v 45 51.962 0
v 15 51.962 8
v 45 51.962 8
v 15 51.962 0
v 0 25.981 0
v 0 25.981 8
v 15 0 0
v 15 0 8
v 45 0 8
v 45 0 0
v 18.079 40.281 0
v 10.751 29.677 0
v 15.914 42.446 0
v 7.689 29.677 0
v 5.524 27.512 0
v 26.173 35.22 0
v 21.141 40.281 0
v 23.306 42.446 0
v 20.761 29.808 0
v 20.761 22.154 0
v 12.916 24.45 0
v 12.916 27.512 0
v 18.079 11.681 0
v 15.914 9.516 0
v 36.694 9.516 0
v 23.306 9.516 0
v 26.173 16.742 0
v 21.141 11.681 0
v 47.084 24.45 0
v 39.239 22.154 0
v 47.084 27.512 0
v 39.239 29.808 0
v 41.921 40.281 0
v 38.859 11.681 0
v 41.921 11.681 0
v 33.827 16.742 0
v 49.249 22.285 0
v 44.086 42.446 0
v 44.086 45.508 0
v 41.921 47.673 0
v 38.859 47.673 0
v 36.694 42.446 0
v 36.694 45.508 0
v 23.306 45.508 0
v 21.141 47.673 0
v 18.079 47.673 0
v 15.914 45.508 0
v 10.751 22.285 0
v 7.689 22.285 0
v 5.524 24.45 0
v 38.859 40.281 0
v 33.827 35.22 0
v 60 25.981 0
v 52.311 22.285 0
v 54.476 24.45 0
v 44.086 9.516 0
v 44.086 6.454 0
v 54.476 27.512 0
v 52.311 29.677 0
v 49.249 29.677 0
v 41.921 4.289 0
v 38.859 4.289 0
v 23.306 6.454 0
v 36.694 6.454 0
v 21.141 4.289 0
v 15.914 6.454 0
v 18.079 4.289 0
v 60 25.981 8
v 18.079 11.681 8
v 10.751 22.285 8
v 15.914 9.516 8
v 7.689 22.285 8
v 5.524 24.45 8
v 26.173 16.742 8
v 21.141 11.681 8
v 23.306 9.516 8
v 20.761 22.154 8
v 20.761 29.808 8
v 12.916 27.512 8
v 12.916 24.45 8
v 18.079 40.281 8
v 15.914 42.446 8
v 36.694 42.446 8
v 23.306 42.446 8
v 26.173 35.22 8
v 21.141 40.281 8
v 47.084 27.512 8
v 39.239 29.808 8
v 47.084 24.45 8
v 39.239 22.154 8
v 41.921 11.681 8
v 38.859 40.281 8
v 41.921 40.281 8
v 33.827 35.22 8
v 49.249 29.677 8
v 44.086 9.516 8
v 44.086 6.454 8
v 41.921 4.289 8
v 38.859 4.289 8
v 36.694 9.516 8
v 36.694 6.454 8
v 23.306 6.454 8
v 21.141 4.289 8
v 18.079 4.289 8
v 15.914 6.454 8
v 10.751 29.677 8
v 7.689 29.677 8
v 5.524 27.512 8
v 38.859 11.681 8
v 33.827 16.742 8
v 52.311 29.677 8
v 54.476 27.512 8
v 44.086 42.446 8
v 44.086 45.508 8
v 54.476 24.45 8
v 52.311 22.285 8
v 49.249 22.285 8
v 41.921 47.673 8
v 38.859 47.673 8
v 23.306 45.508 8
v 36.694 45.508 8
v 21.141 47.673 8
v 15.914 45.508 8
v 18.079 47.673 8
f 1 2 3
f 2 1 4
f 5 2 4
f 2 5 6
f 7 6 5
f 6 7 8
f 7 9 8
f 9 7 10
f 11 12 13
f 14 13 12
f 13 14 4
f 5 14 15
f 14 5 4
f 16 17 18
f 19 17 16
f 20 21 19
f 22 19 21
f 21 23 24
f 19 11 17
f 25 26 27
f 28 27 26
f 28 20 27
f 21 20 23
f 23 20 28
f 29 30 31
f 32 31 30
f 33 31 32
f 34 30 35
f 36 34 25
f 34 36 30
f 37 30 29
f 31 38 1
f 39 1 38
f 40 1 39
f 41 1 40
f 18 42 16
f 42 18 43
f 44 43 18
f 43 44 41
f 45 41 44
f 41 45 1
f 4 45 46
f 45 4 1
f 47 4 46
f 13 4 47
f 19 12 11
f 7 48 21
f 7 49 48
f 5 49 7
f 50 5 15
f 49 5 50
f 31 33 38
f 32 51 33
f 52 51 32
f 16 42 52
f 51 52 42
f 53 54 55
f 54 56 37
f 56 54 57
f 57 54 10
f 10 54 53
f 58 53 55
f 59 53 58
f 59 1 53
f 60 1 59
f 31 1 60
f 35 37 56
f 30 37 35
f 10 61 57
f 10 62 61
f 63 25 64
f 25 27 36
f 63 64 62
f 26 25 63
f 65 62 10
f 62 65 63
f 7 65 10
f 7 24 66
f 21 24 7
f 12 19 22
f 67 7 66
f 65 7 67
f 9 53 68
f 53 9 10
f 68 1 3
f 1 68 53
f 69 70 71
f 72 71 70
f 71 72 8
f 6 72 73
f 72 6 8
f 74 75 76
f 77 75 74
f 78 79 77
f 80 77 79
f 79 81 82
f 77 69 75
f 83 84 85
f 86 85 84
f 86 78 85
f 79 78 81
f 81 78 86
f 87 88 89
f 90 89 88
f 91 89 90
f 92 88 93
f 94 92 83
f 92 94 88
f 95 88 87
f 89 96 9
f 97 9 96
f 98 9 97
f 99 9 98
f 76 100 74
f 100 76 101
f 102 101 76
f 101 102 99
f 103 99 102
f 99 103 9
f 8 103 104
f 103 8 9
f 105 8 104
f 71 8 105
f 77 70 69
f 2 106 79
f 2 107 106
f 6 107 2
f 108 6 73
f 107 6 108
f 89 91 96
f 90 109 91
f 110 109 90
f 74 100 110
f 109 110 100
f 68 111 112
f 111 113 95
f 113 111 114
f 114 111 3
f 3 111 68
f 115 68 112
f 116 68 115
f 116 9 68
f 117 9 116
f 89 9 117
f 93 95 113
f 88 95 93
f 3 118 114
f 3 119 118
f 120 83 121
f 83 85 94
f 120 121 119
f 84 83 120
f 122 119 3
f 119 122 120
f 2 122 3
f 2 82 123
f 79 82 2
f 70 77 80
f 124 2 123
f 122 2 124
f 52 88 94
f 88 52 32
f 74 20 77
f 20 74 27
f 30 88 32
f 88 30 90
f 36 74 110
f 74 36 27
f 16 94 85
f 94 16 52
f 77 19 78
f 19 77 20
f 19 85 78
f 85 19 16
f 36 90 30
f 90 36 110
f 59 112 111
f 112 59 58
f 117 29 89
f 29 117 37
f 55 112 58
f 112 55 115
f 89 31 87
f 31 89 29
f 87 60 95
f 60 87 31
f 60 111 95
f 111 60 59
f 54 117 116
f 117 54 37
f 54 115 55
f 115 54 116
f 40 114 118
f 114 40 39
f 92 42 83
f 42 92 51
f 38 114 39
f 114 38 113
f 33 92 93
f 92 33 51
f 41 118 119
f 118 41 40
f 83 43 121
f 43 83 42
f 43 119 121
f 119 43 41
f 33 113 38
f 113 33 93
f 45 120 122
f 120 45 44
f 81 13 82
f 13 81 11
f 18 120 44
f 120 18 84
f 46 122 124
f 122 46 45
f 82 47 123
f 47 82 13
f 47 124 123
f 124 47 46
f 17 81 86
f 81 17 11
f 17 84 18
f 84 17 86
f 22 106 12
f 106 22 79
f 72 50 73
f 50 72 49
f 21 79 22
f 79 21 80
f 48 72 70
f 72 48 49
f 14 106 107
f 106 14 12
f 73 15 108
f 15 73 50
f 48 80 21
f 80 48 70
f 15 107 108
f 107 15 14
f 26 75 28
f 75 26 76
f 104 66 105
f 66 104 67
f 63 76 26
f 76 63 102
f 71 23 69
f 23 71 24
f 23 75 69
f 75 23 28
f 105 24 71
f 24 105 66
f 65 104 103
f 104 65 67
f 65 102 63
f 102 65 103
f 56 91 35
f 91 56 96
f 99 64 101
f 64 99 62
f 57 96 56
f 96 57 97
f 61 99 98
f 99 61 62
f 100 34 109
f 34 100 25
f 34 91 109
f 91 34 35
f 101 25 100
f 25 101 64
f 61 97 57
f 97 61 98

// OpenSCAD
$fn = 32;

// ----------------------------------------------------------------------
// Polygon plate: 6-gon R30, 6 bolt windows
// ----------------------------------------------------------------------

// --- parameters (mm) ---
sides = 6;                // number of polygon sides
plate_r = 30;             // circumscribed radius of the polygon
bore_r = 10;              // centre bore radius
bolts = 6;                // number of bolt windows
ring_r = 20.78;           // bolt-circle radius
bolt_r = 4;               // bolt window radius
plate_t = 8;              // plate thickness, Z (extrusion height)
fit_tol = 0.02;           // declared fit tolerance (prompt contract)
free_tol = 0.2;           // declared free tolerance (prompt contract)

plate_d = 2 * plate_r;  // circumscribed diameter
bore_d = 2 * bore_r;  // centre bore diameter
bolt_d = 2 * bolt_r;  // bolt window diameter
ring_d = 2 * ring_r;  // bolt-circle diameter

profile = [[60, 25.981], [45, 51.962], [15, 51.962], [0, 25.981], [15, 0], [45, 0]];  // primary outline, 6 points, counter clockwise
void_1 = [[39.239, 29.808], [33.827, 35.22], [26.173, 35.22], [20.761, 29.808], [20.761, 22.154], [26.173, 16.742], [33.827, 16.742], [39.239, 22.154]];  // centre bore, 8 points
void_2 = [[54.476, 27.512], [52.311, 29.677], [49.249, 29.677], [47.084, 27.512], [47.084, 24.45], [49.249, 22.285], [52.311, 22.285], [54.476, 24.45]];  // bolt window 1, 8 points
void_3 = [[44.086, 45.508], [41.921, 47.673], [38.859, 47.673], [36.694, 45.508], [36.694, 42.446], [38.859, 40.281], [41.921, 40.281], [44.086, 42.446]];  // bolt window 2, 8 points
void_4 = [[23.306, 45.508], [21.141, 47.673], [18.079, 47.673], [15.914, 45.508], [15.914, 42.446], [18.079, 40.281], [21.141, 40.281], [23.306, 42.446]];  // bolt window 3, 8 points
void_5 = [[12.916, 27.512], [10.751, 29.677], [7.689, 29.677], [5.524, 27.512], [5.524, 24.45], [7.689, 22.285], [10.751, 22.285], [12.916, 24.45]];  // bolt window 4, 8 points
void_6 = [[23.306, 9.516], [21.141, 11.681], [18.079, 11.681], [15.914, 9.516], [15.914, 6.454], [18.079, 4.289], [21.141, 4.289], [23.306, 6.454]];  // bolt window 5, 8 points
void_7 = [[44.086, 9.516], [41.921, 11.681], [38.859, 11.681], [36.694, 9.516], [36.694, 6.454], [38.859, 4.289], [41.921, 4.289], [44.086, 6.454]];  // bolt window 6, 8 points

// --- the one profile operation ---
difference() {
  linear_extrude(height = plate_t) polygon(points = profile);
  translate([0, 0, -1])
    linear_extrude(height = plate_t + 2) polygon(points = void_1);
  translate([0, 0, -1])
    linear_extrude(height = plate_t + 2) polygon(points = void_2);
  translate([0, 0, -1])
    linear_extrude(height = plate_t + 2) polygon(points = void_3);
  translate([0, 0, -1])
    linear_extrude(height = plate_t + 2) polygon(points = void_4);
  translate([0, 0, -1])
    linear_extrude(height = plate_t + 2) polygon(points = void_5);
  translate([0, 0, -1])
    linear_extrude(height = plate_t + 2) polygon(points = void_6);
  translate([0, 0, -1])
    linear_extrude(height = plate_t + 2) polygon(points = void_7);
}
